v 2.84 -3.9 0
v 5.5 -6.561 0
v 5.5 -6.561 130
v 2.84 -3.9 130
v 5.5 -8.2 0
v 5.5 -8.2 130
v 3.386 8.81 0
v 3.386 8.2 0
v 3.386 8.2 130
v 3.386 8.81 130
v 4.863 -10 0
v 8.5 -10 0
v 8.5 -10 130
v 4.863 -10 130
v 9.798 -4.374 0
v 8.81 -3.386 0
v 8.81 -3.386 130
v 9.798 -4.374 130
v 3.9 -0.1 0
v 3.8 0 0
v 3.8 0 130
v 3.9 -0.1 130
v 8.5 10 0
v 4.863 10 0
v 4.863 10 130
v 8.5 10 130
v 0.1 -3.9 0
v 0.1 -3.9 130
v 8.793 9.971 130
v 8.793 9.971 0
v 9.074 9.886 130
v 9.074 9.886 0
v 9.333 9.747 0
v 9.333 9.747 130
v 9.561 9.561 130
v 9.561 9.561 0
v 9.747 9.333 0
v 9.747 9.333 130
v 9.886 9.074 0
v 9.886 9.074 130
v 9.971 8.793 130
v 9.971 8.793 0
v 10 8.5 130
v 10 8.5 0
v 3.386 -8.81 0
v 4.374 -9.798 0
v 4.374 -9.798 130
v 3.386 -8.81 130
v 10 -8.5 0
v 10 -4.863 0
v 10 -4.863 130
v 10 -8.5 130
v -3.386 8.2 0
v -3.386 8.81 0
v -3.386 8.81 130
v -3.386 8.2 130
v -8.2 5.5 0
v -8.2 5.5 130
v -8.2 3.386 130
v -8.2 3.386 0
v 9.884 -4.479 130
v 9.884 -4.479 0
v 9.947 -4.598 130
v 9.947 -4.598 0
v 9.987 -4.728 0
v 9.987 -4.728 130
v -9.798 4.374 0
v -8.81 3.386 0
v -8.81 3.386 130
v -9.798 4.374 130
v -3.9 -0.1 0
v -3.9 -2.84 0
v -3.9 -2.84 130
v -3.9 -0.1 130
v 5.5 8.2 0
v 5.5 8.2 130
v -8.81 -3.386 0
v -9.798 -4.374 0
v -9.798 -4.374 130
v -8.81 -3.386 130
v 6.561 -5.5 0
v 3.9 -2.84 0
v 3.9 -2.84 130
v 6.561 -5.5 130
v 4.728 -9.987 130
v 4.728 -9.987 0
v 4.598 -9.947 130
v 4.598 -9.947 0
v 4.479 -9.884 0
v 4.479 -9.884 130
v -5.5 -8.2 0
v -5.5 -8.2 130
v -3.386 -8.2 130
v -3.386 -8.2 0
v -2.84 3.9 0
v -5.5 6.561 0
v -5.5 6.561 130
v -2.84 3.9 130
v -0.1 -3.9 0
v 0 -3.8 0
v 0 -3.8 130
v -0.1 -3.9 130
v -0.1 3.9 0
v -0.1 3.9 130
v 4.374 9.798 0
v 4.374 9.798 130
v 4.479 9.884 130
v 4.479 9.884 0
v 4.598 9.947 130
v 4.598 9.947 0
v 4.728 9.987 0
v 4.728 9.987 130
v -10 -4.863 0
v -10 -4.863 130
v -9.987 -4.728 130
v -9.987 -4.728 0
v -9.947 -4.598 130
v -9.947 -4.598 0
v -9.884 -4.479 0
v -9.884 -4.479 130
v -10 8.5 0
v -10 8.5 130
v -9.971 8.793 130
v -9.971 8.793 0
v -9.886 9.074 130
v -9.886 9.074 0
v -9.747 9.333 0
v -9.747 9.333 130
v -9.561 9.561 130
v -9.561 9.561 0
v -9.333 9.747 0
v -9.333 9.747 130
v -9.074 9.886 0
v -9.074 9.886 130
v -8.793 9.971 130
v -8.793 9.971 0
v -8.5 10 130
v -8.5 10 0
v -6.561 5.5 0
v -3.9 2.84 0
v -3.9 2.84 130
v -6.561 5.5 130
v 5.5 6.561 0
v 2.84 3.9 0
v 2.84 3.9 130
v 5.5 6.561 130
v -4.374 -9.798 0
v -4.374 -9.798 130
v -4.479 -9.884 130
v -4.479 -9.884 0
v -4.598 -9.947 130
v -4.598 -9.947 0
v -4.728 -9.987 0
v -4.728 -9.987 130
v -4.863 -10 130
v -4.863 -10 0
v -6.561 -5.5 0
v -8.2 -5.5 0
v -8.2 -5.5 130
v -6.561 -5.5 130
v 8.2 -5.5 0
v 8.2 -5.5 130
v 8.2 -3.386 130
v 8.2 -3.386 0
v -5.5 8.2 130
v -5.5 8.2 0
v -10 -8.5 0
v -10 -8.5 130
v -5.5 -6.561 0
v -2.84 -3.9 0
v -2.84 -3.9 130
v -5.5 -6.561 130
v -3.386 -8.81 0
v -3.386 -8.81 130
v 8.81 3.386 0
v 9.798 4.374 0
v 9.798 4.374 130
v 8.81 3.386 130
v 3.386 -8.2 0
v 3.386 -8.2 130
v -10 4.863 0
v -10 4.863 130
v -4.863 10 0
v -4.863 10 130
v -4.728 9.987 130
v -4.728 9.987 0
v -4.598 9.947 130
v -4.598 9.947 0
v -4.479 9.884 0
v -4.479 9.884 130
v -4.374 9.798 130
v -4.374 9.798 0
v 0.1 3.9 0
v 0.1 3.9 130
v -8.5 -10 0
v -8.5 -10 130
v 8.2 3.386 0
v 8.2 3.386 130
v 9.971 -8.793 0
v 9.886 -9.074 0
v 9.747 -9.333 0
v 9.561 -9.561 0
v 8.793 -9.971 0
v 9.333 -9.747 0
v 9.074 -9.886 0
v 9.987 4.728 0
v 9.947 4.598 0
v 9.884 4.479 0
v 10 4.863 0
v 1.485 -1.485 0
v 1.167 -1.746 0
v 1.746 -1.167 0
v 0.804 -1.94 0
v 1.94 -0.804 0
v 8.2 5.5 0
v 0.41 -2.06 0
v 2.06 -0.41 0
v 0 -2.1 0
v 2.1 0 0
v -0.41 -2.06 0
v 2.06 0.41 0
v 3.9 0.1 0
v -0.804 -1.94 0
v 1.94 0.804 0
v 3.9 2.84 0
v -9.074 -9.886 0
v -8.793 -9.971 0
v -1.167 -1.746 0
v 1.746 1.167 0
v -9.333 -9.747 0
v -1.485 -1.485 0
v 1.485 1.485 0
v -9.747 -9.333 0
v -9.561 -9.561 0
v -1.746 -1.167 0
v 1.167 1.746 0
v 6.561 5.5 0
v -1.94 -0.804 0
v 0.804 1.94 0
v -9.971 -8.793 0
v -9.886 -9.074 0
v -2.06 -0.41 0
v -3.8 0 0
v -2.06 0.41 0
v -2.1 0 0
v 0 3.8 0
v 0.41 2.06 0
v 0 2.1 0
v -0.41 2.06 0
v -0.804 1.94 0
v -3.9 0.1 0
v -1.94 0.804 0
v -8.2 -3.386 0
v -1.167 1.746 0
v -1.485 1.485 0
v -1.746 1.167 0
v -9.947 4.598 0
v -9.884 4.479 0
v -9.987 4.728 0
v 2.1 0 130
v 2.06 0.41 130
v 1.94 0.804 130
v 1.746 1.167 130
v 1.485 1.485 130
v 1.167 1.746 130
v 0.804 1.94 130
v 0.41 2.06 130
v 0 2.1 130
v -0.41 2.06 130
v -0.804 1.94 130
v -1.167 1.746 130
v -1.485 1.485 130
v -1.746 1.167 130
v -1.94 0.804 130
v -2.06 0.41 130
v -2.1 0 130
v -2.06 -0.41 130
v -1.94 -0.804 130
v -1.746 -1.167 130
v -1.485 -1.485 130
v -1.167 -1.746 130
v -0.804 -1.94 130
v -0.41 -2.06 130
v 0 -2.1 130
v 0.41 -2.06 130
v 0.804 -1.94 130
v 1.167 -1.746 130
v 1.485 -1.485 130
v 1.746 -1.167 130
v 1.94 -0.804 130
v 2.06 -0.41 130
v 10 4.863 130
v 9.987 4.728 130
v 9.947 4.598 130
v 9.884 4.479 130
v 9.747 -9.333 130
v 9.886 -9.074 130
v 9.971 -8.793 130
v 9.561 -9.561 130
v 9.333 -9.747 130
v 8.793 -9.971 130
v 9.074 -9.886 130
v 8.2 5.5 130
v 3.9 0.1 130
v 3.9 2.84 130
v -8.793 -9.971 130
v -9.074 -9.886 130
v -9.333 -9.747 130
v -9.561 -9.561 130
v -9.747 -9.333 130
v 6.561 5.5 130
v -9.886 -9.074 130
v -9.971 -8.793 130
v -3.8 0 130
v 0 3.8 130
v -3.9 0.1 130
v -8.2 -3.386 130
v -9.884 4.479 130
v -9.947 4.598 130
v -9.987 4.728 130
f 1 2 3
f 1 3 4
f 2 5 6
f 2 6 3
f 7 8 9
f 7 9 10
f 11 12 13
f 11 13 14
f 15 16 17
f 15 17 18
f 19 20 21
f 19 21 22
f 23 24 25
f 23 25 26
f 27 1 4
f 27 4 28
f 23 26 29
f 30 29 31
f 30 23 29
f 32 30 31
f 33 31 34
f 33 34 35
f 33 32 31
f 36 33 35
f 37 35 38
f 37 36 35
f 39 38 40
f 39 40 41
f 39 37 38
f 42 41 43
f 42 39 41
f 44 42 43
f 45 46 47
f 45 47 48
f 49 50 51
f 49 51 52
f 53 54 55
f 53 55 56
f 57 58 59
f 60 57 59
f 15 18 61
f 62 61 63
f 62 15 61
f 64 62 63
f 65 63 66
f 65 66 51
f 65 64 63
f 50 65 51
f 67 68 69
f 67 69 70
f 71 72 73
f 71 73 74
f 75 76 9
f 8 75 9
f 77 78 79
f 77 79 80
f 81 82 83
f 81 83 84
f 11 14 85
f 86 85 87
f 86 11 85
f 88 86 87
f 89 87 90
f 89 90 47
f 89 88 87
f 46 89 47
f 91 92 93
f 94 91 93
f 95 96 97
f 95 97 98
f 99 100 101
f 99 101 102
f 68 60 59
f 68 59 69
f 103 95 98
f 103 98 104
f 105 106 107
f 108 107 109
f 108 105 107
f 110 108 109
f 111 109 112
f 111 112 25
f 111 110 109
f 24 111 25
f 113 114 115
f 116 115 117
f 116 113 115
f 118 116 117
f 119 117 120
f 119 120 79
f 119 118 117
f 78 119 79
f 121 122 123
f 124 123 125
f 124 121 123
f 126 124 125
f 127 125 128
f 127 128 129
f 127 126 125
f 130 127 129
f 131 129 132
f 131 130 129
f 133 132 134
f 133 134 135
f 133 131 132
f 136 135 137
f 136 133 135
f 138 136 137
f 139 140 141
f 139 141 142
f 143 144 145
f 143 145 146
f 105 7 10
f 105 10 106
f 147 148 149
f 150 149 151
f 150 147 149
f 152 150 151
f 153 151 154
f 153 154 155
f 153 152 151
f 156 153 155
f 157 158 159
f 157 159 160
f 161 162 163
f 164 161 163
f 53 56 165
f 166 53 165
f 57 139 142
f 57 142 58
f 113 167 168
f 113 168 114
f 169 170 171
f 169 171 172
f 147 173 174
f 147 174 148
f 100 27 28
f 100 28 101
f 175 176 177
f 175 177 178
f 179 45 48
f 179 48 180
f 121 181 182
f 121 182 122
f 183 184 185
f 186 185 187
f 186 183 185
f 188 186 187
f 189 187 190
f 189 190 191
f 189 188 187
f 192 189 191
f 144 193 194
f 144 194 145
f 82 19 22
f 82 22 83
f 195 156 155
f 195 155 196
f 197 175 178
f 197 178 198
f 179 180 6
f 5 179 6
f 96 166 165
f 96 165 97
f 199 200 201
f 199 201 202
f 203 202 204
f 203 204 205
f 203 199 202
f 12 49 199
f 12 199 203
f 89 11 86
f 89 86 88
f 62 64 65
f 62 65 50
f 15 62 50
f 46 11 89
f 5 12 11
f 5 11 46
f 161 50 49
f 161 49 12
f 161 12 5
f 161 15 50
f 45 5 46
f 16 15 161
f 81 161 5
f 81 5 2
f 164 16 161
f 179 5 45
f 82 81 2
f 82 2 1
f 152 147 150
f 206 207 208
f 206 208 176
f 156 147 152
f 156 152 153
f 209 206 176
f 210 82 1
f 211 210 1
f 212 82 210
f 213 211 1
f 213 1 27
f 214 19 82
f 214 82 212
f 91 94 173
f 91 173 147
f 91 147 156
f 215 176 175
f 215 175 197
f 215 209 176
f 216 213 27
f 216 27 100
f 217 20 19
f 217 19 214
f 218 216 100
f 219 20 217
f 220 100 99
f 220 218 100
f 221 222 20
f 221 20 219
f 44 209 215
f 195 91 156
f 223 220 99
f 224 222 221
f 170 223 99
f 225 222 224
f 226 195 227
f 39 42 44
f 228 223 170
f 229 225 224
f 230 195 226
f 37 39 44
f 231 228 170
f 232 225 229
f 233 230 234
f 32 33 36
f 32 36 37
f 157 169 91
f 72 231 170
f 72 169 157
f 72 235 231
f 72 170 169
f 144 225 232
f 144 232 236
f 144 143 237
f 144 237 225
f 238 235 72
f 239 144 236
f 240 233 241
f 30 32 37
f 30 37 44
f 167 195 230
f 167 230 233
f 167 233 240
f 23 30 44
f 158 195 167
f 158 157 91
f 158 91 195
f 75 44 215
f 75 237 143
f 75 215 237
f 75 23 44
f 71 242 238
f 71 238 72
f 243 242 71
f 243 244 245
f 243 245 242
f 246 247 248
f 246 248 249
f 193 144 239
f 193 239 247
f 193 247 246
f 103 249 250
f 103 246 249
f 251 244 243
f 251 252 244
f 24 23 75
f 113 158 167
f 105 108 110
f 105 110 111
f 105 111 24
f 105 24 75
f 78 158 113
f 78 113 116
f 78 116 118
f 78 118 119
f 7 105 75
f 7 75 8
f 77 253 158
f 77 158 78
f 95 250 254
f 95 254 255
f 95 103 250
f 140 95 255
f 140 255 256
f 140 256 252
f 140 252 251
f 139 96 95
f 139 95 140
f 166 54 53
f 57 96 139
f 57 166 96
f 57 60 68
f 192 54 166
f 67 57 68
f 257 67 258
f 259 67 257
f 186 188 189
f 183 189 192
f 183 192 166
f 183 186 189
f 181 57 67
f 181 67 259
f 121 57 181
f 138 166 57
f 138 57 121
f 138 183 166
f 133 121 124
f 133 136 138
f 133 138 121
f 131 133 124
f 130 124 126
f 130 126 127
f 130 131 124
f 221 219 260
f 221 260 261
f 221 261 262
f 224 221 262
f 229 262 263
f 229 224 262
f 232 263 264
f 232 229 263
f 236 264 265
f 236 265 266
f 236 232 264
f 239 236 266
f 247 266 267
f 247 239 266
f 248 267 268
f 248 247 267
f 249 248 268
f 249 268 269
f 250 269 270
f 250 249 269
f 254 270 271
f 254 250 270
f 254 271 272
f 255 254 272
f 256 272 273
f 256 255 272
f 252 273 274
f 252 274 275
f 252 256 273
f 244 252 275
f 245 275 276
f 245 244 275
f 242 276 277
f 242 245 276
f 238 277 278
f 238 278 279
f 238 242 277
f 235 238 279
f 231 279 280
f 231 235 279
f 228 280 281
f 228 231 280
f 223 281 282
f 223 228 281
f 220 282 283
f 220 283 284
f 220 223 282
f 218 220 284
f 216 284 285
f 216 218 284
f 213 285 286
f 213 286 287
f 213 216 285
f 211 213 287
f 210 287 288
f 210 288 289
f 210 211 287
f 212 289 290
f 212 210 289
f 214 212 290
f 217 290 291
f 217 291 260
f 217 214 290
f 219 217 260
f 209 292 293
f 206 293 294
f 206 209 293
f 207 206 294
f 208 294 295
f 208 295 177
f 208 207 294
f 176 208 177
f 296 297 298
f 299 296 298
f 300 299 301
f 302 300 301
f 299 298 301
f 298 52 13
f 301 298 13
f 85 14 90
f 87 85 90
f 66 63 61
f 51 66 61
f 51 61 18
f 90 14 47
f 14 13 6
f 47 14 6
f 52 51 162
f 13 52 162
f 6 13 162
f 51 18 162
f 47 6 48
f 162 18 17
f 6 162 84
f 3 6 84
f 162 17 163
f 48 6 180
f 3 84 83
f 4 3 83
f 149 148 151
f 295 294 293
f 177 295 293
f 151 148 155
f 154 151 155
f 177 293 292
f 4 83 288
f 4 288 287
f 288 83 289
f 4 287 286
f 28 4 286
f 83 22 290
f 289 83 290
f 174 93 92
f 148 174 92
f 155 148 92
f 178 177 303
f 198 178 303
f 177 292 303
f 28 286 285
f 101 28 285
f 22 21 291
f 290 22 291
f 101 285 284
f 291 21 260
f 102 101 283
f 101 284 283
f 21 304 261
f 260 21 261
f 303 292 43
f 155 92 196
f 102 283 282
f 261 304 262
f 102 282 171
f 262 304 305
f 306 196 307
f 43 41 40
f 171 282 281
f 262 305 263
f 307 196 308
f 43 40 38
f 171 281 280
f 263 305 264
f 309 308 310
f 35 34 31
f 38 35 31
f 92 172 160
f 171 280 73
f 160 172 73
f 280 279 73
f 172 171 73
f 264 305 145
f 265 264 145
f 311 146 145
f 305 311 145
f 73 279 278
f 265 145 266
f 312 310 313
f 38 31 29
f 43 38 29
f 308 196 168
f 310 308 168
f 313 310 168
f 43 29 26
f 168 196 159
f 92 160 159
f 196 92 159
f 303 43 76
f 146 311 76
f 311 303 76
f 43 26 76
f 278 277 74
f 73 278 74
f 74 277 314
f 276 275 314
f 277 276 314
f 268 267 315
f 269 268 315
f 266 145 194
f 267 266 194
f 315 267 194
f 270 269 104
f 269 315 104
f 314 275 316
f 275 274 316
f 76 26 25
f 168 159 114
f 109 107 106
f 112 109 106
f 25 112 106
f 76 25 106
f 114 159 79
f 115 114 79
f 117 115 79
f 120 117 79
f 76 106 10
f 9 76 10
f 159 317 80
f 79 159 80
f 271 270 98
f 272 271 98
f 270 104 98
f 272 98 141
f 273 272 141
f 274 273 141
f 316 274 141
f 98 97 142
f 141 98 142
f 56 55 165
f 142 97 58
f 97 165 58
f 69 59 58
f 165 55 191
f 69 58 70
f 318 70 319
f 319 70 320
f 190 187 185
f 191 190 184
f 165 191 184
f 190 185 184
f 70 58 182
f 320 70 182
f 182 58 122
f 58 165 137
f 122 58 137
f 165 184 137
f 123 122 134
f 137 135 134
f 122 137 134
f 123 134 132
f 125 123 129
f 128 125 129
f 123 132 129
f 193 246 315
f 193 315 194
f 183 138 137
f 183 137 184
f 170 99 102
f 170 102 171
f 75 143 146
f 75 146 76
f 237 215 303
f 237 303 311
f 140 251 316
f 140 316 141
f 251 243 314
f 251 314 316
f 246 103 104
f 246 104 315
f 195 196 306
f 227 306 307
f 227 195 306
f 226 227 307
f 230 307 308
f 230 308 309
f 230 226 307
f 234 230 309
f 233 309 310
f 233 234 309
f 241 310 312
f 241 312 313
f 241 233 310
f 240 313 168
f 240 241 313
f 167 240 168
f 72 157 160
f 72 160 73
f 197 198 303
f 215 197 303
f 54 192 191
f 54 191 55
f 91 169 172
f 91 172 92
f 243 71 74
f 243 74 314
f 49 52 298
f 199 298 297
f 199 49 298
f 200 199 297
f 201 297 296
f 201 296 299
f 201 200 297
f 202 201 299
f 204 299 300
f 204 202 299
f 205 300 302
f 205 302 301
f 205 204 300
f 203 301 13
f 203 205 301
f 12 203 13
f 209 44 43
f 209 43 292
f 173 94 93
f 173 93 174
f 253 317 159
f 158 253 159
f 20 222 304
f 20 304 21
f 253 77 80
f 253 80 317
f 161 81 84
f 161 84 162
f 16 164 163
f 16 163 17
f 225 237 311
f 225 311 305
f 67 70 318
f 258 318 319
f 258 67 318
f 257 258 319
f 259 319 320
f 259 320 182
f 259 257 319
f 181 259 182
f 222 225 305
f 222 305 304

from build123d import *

# Parameters (mm, degrees)
SKETCH1_R           = 2.1
BOSS_EXTRUDE1_DEPTH = 130


with BuildPart() as part:
    # Sketch1 → Boss-Extrude1 (new body)
    with BuildSketch(Plane.XY):
        with BuildLine():
            Line((-8.5, 10), (-4.862792737, 10))
            ThreePointArc((-4.862792737, 10), (-4.598292737, 9.947387679), (-4.374060464, 9.797560464))
            Line((-4.374060464, 9.797560464), (-3.3865, 8.81))
            Line((-3.3865, 8.81), (-3.3865, 8.2))
            Line((-3.3865, 8.2), (-5.5, 8.2))
            Line((-5.5, 8.2), (-5.5, 6.561))
            Line((-5.5, 6.561), (-2.8395, 3.9005))
            Line((-2.8395, 3.9005), (-0.1, 3.9005))
            Line((-0.1, 3.9005), (0, 3.8005))
            Line((0, 3.8005), (0.1, 3.9005))
            Line((0.1, 3.9005), (2.8395, 3.9005))
            Line((2.8395, 3.9005), (5.5, 6.561))
            Line((5.5, 6.561), (5.5, 8.2))
            Line((5.5, 8.2), (3.3865, 8.2))
            Line((3.3865, 8.2), (3.3865, 8.81))
            Line((3.3865, 8.81), (4.374060464, 9.797560464))
            ThreePointArc((4.374060464, 9.797560464), (4.598292737, 9.947387679), (4.862792737, 10))
            Line((4.862792737, 10), (8.5, 10))
            ThreePointArc((8.5, 10), (9.560660172, 9.560660172), (10, 8.5))
            Line((10, 8.5), (10, 4.862792737))
            ThreePointArc((10, 4.862792737), (9.947387679, 4.598292737), (9.797560464, 4.374060464))
            Line((9.797560464, 4.374060464), (8.81, 3.3865))
            Line((8.81, 3.3865), (8.2, 3.3865))
            Line((8.2, 3.3865), (8.2, 5.5))
            Line((8.2, 5.5), (6.561, 5.5))
            Line((6.561, 5.5), (3.9005, 2.8395))
            Line((3.9005, 2.8395), (3.9005, 0.1))
            Line((3.9005, 0.1), (3.8005, 0))
            Line((3.8005, 0), (3.9005, -0.1))
            Line((3.9005, -0.1), (3.9005, -2.8395))
            Line((3.9005, -2.8395), (6.561, -5.5))
            Line((6.561, -5.5), (8.2, -5.5))
            Line((8.2, -5.5), (8.2, -3.3865))
            Line((8.2, -3.3865), (8.81, -3.3865))
            Line((8.81, -3.3865), (9.797560464, -4.374060464))
            ThreePointArc((9.797560464, -4.374060464), (9.947387679, -4.598292737), (10, -4.862792737))
            Line((10, -4.862792737), (10, -8.5))
            ThreePointArc((10, -8.5), (9.560660172, -9.560660172), (8.5, -10))
            Line((8.5, -10), (4.862792737, -10))
            ThreePointArc((4.862792737, -10), (4.598292737, -9.947387679), (4.374060464, -9.797560464))
            Line((4.374060464, -9.797560464), (3.3865, -8.81))
            Line((3.3865, -8.81), (3.3865, -8.2))
            Line((3.3865, -8.2), (5.5, -8.2))
            Line((5.5, -8.2), (5.5, -6.561))
            Line((5.5, -6.561), (2.8395, -3.9005))
            Line((2.8395, -3.9005), (0.1, -3.9005))
            Line((0.1, -3.9005), (0, -3.8005))
            Line((0, -3.8005), (-0.1, -3.9005))
            Line((-0.1, -3.9005), (-2.8395, -3.9005))
            Line((-2.8395, -3.9005), (-5.5, -6.561))
            Line((-5.5, -6.561), (-5.5, -8.2))
            Line((-5.5, -8.2), (-3.3865, -8.2))
            Line((-3.3865, -8.2), (-3.3865, -8.81))
            Line((-3.3865, -8.81), (-4.374060464, -9.797560464))
            ThreePointArc((-4.374060464, -9.797560464), (-4.598292737, -9.947387679), (-4.862792737, -10))
            Line((-4.862792737, -10), (-8.5, -10))
            ThreePointArc((-8.5, -10), (-9.560660172, -9.560660172), (-10, -8.5))
            Line((-10, -8.5), (-10, -4.862792737))
            ThreePointArc((-10, -4.862792737), (-9.947387679, -4.598292737), (-9.797560464, -4.374060464))
            Line((-9.797560464, -4.374060464), (-8.81, -3.3865))
            Line((-8.81, -3.3865), (-8.2, -3.3865))
            Line((-8.2, -3.3865), (-8.2, -5.5))
            Line((-8.2, -5.5), (-6.561, -5.5))
            Line((-6.561, -5.5), (-3.9005, -2.8395))
            Line((-3.9005, -2.8395), (-3.9005, -0.1))
            Line((-3.9005, -0.1), (-3.8005, 0))
            Line((-3.8005, 0), (-3.9005, 0.1))
            Line((-3.9005, 0.1), (-3.9005, 2.8395))
            Line((-3.9005, 2.8395), (-6.561, 5.5))
            Line((-6.561, 5.5), (-8.2, 5.5))
            Line((-8.2, 5.5), (-8.2, 3.3865))
            Line((-8.2, 3.3865), (-8.81, 3.3865))
            Line((-8.81, 3.3865), (-9.797560464, 4.374060464))
            ThreePointArc((-9.797560464, 4.374060464), (-9.947387679, 4.598292737), (-10, 4.862792737))
            Line((-10, 4.862792737), (-10, 8.5))
            ThreePointArc((-10, 8.5), (-9.560660172, 9.560660172), (-8.5, 10))
        make_face()
        Circle(SKETCH1_R, mode=Mode.SUBTRACT)
    extrude(amount=BOSS_EXTRUDE1_DEPTH)


solid = part.part
